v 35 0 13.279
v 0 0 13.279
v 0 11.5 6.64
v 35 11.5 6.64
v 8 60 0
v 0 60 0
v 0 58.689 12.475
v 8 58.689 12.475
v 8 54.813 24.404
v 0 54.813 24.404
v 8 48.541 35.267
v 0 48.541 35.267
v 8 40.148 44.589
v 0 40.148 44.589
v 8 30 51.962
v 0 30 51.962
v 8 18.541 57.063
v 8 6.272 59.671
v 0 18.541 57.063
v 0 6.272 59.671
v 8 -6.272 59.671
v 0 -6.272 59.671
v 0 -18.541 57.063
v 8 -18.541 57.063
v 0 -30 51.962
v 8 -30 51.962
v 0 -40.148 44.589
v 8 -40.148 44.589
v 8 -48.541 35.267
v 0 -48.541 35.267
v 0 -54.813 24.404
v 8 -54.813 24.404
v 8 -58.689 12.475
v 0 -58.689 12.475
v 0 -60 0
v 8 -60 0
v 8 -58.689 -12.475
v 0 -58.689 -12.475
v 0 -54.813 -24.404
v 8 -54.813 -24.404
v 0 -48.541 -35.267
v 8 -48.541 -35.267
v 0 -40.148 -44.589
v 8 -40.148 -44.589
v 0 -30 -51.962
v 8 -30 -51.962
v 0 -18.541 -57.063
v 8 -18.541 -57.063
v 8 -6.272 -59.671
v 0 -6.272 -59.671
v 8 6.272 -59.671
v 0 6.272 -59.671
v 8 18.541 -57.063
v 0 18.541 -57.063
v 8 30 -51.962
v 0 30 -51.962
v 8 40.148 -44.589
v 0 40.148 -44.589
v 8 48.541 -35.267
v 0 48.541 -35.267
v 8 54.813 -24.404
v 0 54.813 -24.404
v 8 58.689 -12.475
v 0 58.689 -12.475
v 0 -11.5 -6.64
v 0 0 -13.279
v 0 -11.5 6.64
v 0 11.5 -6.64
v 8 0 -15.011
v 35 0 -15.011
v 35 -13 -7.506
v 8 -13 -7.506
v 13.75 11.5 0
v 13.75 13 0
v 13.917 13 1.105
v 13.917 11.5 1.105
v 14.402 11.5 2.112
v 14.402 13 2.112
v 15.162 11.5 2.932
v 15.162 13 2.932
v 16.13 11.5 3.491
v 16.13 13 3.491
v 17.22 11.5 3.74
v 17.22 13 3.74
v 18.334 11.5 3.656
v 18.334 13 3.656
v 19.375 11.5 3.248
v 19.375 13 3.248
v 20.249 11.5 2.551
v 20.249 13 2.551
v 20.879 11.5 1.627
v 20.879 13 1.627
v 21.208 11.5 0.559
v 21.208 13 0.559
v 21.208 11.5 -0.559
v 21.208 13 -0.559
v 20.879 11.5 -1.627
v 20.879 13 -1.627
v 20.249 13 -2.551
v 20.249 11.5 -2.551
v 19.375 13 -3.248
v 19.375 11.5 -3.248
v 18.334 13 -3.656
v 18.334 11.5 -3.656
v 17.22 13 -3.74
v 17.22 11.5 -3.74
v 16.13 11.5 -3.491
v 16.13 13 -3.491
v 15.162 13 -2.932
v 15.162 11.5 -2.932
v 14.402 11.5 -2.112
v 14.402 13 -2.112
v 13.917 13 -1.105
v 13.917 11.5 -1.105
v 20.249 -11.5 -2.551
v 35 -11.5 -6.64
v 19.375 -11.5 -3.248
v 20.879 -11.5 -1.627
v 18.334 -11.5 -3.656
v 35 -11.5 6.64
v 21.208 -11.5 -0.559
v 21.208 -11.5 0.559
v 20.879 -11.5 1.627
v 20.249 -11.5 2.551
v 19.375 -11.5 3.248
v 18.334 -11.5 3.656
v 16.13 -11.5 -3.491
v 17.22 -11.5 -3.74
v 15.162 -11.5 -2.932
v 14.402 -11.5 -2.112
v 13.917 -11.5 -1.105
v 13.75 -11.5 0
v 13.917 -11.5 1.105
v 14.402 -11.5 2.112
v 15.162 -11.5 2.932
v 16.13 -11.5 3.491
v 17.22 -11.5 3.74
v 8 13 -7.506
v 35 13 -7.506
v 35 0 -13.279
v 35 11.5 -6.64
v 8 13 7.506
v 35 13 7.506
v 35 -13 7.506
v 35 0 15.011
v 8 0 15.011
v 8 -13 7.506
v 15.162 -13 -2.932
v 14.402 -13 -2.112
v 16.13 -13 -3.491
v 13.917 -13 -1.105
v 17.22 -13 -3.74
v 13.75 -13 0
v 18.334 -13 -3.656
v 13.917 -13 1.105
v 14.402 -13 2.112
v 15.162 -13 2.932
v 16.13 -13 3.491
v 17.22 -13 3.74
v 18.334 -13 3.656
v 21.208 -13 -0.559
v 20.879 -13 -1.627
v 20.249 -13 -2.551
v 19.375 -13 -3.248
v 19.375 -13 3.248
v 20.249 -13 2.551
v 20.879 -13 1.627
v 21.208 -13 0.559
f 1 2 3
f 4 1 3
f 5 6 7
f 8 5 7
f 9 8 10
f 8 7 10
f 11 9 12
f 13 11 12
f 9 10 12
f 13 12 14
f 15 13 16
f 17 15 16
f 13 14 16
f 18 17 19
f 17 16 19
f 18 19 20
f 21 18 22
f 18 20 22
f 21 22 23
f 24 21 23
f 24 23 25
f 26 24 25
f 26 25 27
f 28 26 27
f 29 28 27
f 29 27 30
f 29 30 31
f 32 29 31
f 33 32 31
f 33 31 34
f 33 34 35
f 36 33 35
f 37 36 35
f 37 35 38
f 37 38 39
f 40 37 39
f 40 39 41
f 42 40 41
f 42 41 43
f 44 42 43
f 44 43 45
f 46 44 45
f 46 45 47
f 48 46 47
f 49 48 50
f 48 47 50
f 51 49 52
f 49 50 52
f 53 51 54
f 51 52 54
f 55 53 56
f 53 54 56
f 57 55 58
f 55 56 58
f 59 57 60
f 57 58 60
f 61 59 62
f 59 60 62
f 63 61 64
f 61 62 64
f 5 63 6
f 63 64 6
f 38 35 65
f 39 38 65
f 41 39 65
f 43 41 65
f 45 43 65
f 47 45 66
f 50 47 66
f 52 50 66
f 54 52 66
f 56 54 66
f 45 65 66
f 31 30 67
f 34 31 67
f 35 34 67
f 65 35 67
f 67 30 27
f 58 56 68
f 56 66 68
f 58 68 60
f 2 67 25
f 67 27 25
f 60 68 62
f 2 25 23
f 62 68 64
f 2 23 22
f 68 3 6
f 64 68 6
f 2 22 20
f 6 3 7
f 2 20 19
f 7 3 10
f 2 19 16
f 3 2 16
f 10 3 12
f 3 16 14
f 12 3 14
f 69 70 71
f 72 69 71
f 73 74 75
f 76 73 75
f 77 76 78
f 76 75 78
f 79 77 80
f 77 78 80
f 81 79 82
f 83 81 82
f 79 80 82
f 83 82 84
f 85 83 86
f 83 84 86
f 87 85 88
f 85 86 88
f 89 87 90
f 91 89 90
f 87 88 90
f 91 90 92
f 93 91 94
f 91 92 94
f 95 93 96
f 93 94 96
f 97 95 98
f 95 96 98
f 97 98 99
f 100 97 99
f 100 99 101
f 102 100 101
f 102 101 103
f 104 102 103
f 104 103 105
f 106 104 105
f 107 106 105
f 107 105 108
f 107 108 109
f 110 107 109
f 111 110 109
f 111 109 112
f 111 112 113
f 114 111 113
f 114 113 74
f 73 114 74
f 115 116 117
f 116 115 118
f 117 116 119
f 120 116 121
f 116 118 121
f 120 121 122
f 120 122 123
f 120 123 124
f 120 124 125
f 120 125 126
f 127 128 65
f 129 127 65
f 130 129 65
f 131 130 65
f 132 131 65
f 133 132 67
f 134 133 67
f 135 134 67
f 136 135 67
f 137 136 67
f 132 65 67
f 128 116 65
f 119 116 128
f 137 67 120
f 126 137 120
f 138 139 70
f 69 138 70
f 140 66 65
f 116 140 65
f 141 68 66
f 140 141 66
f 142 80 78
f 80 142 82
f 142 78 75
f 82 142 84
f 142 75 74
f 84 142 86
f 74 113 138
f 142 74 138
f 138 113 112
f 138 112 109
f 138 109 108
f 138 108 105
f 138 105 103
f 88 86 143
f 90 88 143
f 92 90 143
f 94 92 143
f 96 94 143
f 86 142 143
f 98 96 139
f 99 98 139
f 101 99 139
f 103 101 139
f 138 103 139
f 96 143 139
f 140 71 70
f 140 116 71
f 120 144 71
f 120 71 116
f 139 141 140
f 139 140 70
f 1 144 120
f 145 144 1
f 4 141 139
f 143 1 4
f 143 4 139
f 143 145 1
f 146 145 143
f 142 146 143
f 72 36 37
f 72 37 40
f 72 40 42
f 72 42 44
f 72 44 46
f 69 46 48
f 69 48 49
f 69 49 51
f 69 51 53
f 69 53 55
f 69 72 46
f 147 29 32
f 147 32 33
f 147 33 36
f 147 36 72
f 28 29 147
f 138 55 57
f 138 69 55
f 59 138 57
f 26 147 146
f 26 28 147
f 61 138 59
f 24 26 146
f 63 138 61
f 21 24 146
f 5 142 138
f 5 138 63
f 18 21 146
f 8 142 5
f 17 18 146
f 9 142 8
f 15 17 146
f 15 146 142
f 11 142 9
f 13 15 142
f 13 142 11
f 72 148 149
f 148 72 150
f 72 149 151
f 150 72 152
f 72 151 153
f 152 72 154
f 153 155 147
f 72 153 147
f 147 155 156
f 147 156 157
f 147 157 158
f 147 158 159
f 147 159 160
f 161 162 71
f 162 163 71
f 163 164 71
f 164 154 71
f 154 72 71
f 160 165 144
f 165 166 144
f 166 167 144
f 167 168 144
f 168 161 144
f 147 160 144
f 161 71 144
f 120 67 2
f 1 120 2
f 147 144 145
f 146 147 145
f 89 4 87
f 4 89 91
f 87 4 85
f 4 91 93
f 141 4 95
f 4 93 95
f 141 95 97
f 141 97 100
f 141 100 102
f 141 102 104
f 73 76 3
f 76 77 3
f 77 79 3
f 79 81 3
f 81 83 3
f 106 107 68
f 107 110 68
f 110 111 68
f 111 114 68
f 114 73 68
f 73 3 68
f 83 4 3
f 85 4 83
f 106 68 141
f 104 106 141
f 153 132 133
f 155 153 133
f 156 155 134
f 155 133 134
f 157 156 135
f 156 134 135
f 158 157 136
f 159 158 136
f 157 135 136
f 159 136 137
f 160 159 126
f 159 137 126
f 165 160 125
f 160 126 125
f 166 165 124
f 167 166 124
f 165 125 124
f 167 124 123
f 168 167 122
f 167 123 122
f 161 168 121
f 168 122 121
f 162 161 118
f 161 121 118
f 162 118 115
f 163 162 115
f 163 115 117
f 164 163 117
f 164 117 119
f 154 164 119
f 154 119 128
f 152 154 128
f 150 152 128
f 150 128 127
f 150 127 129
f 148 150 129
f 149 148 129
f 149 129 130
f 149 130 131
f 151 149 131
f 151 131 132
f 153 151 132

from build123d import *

# Parameters (mm, degrees)
F0_R     = 60
F1_DEPTH = 35
F2_R     = 60
F3_DEPTH = 27
F4_R     = 3.75
F5_DEPTH = 44.75074


with BuildPart() as f1:
    # F0 (on Right) → F1 (new body)
    with BuildSketch(Plane.YZ):
        Circle(F0_R)
        Polygon((0, 13.2790561914), (11.5, 6.6395280957), (11.5, -6.6395280957), (0, -13.2790561914), (-11.5, -6.6395280957), (-11.5, 6.6395280957), align=None, mode=Mode.SUBTRACT)
    extrude(amount=F1_DEPTH)

    # F2 (on face) → F3 (cut)
    with BuildSketch(Plane.YZ.offset(35)):
        Circle(F2_R)
        Polygon((0, 15.0111069989), (13, 7.5055534995), (13, -7.5055534995), (0, -15.0111069989), (-13, -7.5055534995), (-13, 7.5055534995), align=None, mode=Mode.SUBTRACT)
    extrude(amount=-F3_DEPTH, mode=Mode.SUBTRACT)

    # F4 (on face) → F5 (cut)
    with BuildSketch(Plane(origin=(0, 13, 0), x_dir=(-1, 0, 0), z_dir=(0, 1, 0))):
        with Locations((-17.5, 0)):
            Circle(F4_R)
    extrude(amount=-F5_DEPTH, mode=Mode.SUBTRACT)


solid = f1.part
